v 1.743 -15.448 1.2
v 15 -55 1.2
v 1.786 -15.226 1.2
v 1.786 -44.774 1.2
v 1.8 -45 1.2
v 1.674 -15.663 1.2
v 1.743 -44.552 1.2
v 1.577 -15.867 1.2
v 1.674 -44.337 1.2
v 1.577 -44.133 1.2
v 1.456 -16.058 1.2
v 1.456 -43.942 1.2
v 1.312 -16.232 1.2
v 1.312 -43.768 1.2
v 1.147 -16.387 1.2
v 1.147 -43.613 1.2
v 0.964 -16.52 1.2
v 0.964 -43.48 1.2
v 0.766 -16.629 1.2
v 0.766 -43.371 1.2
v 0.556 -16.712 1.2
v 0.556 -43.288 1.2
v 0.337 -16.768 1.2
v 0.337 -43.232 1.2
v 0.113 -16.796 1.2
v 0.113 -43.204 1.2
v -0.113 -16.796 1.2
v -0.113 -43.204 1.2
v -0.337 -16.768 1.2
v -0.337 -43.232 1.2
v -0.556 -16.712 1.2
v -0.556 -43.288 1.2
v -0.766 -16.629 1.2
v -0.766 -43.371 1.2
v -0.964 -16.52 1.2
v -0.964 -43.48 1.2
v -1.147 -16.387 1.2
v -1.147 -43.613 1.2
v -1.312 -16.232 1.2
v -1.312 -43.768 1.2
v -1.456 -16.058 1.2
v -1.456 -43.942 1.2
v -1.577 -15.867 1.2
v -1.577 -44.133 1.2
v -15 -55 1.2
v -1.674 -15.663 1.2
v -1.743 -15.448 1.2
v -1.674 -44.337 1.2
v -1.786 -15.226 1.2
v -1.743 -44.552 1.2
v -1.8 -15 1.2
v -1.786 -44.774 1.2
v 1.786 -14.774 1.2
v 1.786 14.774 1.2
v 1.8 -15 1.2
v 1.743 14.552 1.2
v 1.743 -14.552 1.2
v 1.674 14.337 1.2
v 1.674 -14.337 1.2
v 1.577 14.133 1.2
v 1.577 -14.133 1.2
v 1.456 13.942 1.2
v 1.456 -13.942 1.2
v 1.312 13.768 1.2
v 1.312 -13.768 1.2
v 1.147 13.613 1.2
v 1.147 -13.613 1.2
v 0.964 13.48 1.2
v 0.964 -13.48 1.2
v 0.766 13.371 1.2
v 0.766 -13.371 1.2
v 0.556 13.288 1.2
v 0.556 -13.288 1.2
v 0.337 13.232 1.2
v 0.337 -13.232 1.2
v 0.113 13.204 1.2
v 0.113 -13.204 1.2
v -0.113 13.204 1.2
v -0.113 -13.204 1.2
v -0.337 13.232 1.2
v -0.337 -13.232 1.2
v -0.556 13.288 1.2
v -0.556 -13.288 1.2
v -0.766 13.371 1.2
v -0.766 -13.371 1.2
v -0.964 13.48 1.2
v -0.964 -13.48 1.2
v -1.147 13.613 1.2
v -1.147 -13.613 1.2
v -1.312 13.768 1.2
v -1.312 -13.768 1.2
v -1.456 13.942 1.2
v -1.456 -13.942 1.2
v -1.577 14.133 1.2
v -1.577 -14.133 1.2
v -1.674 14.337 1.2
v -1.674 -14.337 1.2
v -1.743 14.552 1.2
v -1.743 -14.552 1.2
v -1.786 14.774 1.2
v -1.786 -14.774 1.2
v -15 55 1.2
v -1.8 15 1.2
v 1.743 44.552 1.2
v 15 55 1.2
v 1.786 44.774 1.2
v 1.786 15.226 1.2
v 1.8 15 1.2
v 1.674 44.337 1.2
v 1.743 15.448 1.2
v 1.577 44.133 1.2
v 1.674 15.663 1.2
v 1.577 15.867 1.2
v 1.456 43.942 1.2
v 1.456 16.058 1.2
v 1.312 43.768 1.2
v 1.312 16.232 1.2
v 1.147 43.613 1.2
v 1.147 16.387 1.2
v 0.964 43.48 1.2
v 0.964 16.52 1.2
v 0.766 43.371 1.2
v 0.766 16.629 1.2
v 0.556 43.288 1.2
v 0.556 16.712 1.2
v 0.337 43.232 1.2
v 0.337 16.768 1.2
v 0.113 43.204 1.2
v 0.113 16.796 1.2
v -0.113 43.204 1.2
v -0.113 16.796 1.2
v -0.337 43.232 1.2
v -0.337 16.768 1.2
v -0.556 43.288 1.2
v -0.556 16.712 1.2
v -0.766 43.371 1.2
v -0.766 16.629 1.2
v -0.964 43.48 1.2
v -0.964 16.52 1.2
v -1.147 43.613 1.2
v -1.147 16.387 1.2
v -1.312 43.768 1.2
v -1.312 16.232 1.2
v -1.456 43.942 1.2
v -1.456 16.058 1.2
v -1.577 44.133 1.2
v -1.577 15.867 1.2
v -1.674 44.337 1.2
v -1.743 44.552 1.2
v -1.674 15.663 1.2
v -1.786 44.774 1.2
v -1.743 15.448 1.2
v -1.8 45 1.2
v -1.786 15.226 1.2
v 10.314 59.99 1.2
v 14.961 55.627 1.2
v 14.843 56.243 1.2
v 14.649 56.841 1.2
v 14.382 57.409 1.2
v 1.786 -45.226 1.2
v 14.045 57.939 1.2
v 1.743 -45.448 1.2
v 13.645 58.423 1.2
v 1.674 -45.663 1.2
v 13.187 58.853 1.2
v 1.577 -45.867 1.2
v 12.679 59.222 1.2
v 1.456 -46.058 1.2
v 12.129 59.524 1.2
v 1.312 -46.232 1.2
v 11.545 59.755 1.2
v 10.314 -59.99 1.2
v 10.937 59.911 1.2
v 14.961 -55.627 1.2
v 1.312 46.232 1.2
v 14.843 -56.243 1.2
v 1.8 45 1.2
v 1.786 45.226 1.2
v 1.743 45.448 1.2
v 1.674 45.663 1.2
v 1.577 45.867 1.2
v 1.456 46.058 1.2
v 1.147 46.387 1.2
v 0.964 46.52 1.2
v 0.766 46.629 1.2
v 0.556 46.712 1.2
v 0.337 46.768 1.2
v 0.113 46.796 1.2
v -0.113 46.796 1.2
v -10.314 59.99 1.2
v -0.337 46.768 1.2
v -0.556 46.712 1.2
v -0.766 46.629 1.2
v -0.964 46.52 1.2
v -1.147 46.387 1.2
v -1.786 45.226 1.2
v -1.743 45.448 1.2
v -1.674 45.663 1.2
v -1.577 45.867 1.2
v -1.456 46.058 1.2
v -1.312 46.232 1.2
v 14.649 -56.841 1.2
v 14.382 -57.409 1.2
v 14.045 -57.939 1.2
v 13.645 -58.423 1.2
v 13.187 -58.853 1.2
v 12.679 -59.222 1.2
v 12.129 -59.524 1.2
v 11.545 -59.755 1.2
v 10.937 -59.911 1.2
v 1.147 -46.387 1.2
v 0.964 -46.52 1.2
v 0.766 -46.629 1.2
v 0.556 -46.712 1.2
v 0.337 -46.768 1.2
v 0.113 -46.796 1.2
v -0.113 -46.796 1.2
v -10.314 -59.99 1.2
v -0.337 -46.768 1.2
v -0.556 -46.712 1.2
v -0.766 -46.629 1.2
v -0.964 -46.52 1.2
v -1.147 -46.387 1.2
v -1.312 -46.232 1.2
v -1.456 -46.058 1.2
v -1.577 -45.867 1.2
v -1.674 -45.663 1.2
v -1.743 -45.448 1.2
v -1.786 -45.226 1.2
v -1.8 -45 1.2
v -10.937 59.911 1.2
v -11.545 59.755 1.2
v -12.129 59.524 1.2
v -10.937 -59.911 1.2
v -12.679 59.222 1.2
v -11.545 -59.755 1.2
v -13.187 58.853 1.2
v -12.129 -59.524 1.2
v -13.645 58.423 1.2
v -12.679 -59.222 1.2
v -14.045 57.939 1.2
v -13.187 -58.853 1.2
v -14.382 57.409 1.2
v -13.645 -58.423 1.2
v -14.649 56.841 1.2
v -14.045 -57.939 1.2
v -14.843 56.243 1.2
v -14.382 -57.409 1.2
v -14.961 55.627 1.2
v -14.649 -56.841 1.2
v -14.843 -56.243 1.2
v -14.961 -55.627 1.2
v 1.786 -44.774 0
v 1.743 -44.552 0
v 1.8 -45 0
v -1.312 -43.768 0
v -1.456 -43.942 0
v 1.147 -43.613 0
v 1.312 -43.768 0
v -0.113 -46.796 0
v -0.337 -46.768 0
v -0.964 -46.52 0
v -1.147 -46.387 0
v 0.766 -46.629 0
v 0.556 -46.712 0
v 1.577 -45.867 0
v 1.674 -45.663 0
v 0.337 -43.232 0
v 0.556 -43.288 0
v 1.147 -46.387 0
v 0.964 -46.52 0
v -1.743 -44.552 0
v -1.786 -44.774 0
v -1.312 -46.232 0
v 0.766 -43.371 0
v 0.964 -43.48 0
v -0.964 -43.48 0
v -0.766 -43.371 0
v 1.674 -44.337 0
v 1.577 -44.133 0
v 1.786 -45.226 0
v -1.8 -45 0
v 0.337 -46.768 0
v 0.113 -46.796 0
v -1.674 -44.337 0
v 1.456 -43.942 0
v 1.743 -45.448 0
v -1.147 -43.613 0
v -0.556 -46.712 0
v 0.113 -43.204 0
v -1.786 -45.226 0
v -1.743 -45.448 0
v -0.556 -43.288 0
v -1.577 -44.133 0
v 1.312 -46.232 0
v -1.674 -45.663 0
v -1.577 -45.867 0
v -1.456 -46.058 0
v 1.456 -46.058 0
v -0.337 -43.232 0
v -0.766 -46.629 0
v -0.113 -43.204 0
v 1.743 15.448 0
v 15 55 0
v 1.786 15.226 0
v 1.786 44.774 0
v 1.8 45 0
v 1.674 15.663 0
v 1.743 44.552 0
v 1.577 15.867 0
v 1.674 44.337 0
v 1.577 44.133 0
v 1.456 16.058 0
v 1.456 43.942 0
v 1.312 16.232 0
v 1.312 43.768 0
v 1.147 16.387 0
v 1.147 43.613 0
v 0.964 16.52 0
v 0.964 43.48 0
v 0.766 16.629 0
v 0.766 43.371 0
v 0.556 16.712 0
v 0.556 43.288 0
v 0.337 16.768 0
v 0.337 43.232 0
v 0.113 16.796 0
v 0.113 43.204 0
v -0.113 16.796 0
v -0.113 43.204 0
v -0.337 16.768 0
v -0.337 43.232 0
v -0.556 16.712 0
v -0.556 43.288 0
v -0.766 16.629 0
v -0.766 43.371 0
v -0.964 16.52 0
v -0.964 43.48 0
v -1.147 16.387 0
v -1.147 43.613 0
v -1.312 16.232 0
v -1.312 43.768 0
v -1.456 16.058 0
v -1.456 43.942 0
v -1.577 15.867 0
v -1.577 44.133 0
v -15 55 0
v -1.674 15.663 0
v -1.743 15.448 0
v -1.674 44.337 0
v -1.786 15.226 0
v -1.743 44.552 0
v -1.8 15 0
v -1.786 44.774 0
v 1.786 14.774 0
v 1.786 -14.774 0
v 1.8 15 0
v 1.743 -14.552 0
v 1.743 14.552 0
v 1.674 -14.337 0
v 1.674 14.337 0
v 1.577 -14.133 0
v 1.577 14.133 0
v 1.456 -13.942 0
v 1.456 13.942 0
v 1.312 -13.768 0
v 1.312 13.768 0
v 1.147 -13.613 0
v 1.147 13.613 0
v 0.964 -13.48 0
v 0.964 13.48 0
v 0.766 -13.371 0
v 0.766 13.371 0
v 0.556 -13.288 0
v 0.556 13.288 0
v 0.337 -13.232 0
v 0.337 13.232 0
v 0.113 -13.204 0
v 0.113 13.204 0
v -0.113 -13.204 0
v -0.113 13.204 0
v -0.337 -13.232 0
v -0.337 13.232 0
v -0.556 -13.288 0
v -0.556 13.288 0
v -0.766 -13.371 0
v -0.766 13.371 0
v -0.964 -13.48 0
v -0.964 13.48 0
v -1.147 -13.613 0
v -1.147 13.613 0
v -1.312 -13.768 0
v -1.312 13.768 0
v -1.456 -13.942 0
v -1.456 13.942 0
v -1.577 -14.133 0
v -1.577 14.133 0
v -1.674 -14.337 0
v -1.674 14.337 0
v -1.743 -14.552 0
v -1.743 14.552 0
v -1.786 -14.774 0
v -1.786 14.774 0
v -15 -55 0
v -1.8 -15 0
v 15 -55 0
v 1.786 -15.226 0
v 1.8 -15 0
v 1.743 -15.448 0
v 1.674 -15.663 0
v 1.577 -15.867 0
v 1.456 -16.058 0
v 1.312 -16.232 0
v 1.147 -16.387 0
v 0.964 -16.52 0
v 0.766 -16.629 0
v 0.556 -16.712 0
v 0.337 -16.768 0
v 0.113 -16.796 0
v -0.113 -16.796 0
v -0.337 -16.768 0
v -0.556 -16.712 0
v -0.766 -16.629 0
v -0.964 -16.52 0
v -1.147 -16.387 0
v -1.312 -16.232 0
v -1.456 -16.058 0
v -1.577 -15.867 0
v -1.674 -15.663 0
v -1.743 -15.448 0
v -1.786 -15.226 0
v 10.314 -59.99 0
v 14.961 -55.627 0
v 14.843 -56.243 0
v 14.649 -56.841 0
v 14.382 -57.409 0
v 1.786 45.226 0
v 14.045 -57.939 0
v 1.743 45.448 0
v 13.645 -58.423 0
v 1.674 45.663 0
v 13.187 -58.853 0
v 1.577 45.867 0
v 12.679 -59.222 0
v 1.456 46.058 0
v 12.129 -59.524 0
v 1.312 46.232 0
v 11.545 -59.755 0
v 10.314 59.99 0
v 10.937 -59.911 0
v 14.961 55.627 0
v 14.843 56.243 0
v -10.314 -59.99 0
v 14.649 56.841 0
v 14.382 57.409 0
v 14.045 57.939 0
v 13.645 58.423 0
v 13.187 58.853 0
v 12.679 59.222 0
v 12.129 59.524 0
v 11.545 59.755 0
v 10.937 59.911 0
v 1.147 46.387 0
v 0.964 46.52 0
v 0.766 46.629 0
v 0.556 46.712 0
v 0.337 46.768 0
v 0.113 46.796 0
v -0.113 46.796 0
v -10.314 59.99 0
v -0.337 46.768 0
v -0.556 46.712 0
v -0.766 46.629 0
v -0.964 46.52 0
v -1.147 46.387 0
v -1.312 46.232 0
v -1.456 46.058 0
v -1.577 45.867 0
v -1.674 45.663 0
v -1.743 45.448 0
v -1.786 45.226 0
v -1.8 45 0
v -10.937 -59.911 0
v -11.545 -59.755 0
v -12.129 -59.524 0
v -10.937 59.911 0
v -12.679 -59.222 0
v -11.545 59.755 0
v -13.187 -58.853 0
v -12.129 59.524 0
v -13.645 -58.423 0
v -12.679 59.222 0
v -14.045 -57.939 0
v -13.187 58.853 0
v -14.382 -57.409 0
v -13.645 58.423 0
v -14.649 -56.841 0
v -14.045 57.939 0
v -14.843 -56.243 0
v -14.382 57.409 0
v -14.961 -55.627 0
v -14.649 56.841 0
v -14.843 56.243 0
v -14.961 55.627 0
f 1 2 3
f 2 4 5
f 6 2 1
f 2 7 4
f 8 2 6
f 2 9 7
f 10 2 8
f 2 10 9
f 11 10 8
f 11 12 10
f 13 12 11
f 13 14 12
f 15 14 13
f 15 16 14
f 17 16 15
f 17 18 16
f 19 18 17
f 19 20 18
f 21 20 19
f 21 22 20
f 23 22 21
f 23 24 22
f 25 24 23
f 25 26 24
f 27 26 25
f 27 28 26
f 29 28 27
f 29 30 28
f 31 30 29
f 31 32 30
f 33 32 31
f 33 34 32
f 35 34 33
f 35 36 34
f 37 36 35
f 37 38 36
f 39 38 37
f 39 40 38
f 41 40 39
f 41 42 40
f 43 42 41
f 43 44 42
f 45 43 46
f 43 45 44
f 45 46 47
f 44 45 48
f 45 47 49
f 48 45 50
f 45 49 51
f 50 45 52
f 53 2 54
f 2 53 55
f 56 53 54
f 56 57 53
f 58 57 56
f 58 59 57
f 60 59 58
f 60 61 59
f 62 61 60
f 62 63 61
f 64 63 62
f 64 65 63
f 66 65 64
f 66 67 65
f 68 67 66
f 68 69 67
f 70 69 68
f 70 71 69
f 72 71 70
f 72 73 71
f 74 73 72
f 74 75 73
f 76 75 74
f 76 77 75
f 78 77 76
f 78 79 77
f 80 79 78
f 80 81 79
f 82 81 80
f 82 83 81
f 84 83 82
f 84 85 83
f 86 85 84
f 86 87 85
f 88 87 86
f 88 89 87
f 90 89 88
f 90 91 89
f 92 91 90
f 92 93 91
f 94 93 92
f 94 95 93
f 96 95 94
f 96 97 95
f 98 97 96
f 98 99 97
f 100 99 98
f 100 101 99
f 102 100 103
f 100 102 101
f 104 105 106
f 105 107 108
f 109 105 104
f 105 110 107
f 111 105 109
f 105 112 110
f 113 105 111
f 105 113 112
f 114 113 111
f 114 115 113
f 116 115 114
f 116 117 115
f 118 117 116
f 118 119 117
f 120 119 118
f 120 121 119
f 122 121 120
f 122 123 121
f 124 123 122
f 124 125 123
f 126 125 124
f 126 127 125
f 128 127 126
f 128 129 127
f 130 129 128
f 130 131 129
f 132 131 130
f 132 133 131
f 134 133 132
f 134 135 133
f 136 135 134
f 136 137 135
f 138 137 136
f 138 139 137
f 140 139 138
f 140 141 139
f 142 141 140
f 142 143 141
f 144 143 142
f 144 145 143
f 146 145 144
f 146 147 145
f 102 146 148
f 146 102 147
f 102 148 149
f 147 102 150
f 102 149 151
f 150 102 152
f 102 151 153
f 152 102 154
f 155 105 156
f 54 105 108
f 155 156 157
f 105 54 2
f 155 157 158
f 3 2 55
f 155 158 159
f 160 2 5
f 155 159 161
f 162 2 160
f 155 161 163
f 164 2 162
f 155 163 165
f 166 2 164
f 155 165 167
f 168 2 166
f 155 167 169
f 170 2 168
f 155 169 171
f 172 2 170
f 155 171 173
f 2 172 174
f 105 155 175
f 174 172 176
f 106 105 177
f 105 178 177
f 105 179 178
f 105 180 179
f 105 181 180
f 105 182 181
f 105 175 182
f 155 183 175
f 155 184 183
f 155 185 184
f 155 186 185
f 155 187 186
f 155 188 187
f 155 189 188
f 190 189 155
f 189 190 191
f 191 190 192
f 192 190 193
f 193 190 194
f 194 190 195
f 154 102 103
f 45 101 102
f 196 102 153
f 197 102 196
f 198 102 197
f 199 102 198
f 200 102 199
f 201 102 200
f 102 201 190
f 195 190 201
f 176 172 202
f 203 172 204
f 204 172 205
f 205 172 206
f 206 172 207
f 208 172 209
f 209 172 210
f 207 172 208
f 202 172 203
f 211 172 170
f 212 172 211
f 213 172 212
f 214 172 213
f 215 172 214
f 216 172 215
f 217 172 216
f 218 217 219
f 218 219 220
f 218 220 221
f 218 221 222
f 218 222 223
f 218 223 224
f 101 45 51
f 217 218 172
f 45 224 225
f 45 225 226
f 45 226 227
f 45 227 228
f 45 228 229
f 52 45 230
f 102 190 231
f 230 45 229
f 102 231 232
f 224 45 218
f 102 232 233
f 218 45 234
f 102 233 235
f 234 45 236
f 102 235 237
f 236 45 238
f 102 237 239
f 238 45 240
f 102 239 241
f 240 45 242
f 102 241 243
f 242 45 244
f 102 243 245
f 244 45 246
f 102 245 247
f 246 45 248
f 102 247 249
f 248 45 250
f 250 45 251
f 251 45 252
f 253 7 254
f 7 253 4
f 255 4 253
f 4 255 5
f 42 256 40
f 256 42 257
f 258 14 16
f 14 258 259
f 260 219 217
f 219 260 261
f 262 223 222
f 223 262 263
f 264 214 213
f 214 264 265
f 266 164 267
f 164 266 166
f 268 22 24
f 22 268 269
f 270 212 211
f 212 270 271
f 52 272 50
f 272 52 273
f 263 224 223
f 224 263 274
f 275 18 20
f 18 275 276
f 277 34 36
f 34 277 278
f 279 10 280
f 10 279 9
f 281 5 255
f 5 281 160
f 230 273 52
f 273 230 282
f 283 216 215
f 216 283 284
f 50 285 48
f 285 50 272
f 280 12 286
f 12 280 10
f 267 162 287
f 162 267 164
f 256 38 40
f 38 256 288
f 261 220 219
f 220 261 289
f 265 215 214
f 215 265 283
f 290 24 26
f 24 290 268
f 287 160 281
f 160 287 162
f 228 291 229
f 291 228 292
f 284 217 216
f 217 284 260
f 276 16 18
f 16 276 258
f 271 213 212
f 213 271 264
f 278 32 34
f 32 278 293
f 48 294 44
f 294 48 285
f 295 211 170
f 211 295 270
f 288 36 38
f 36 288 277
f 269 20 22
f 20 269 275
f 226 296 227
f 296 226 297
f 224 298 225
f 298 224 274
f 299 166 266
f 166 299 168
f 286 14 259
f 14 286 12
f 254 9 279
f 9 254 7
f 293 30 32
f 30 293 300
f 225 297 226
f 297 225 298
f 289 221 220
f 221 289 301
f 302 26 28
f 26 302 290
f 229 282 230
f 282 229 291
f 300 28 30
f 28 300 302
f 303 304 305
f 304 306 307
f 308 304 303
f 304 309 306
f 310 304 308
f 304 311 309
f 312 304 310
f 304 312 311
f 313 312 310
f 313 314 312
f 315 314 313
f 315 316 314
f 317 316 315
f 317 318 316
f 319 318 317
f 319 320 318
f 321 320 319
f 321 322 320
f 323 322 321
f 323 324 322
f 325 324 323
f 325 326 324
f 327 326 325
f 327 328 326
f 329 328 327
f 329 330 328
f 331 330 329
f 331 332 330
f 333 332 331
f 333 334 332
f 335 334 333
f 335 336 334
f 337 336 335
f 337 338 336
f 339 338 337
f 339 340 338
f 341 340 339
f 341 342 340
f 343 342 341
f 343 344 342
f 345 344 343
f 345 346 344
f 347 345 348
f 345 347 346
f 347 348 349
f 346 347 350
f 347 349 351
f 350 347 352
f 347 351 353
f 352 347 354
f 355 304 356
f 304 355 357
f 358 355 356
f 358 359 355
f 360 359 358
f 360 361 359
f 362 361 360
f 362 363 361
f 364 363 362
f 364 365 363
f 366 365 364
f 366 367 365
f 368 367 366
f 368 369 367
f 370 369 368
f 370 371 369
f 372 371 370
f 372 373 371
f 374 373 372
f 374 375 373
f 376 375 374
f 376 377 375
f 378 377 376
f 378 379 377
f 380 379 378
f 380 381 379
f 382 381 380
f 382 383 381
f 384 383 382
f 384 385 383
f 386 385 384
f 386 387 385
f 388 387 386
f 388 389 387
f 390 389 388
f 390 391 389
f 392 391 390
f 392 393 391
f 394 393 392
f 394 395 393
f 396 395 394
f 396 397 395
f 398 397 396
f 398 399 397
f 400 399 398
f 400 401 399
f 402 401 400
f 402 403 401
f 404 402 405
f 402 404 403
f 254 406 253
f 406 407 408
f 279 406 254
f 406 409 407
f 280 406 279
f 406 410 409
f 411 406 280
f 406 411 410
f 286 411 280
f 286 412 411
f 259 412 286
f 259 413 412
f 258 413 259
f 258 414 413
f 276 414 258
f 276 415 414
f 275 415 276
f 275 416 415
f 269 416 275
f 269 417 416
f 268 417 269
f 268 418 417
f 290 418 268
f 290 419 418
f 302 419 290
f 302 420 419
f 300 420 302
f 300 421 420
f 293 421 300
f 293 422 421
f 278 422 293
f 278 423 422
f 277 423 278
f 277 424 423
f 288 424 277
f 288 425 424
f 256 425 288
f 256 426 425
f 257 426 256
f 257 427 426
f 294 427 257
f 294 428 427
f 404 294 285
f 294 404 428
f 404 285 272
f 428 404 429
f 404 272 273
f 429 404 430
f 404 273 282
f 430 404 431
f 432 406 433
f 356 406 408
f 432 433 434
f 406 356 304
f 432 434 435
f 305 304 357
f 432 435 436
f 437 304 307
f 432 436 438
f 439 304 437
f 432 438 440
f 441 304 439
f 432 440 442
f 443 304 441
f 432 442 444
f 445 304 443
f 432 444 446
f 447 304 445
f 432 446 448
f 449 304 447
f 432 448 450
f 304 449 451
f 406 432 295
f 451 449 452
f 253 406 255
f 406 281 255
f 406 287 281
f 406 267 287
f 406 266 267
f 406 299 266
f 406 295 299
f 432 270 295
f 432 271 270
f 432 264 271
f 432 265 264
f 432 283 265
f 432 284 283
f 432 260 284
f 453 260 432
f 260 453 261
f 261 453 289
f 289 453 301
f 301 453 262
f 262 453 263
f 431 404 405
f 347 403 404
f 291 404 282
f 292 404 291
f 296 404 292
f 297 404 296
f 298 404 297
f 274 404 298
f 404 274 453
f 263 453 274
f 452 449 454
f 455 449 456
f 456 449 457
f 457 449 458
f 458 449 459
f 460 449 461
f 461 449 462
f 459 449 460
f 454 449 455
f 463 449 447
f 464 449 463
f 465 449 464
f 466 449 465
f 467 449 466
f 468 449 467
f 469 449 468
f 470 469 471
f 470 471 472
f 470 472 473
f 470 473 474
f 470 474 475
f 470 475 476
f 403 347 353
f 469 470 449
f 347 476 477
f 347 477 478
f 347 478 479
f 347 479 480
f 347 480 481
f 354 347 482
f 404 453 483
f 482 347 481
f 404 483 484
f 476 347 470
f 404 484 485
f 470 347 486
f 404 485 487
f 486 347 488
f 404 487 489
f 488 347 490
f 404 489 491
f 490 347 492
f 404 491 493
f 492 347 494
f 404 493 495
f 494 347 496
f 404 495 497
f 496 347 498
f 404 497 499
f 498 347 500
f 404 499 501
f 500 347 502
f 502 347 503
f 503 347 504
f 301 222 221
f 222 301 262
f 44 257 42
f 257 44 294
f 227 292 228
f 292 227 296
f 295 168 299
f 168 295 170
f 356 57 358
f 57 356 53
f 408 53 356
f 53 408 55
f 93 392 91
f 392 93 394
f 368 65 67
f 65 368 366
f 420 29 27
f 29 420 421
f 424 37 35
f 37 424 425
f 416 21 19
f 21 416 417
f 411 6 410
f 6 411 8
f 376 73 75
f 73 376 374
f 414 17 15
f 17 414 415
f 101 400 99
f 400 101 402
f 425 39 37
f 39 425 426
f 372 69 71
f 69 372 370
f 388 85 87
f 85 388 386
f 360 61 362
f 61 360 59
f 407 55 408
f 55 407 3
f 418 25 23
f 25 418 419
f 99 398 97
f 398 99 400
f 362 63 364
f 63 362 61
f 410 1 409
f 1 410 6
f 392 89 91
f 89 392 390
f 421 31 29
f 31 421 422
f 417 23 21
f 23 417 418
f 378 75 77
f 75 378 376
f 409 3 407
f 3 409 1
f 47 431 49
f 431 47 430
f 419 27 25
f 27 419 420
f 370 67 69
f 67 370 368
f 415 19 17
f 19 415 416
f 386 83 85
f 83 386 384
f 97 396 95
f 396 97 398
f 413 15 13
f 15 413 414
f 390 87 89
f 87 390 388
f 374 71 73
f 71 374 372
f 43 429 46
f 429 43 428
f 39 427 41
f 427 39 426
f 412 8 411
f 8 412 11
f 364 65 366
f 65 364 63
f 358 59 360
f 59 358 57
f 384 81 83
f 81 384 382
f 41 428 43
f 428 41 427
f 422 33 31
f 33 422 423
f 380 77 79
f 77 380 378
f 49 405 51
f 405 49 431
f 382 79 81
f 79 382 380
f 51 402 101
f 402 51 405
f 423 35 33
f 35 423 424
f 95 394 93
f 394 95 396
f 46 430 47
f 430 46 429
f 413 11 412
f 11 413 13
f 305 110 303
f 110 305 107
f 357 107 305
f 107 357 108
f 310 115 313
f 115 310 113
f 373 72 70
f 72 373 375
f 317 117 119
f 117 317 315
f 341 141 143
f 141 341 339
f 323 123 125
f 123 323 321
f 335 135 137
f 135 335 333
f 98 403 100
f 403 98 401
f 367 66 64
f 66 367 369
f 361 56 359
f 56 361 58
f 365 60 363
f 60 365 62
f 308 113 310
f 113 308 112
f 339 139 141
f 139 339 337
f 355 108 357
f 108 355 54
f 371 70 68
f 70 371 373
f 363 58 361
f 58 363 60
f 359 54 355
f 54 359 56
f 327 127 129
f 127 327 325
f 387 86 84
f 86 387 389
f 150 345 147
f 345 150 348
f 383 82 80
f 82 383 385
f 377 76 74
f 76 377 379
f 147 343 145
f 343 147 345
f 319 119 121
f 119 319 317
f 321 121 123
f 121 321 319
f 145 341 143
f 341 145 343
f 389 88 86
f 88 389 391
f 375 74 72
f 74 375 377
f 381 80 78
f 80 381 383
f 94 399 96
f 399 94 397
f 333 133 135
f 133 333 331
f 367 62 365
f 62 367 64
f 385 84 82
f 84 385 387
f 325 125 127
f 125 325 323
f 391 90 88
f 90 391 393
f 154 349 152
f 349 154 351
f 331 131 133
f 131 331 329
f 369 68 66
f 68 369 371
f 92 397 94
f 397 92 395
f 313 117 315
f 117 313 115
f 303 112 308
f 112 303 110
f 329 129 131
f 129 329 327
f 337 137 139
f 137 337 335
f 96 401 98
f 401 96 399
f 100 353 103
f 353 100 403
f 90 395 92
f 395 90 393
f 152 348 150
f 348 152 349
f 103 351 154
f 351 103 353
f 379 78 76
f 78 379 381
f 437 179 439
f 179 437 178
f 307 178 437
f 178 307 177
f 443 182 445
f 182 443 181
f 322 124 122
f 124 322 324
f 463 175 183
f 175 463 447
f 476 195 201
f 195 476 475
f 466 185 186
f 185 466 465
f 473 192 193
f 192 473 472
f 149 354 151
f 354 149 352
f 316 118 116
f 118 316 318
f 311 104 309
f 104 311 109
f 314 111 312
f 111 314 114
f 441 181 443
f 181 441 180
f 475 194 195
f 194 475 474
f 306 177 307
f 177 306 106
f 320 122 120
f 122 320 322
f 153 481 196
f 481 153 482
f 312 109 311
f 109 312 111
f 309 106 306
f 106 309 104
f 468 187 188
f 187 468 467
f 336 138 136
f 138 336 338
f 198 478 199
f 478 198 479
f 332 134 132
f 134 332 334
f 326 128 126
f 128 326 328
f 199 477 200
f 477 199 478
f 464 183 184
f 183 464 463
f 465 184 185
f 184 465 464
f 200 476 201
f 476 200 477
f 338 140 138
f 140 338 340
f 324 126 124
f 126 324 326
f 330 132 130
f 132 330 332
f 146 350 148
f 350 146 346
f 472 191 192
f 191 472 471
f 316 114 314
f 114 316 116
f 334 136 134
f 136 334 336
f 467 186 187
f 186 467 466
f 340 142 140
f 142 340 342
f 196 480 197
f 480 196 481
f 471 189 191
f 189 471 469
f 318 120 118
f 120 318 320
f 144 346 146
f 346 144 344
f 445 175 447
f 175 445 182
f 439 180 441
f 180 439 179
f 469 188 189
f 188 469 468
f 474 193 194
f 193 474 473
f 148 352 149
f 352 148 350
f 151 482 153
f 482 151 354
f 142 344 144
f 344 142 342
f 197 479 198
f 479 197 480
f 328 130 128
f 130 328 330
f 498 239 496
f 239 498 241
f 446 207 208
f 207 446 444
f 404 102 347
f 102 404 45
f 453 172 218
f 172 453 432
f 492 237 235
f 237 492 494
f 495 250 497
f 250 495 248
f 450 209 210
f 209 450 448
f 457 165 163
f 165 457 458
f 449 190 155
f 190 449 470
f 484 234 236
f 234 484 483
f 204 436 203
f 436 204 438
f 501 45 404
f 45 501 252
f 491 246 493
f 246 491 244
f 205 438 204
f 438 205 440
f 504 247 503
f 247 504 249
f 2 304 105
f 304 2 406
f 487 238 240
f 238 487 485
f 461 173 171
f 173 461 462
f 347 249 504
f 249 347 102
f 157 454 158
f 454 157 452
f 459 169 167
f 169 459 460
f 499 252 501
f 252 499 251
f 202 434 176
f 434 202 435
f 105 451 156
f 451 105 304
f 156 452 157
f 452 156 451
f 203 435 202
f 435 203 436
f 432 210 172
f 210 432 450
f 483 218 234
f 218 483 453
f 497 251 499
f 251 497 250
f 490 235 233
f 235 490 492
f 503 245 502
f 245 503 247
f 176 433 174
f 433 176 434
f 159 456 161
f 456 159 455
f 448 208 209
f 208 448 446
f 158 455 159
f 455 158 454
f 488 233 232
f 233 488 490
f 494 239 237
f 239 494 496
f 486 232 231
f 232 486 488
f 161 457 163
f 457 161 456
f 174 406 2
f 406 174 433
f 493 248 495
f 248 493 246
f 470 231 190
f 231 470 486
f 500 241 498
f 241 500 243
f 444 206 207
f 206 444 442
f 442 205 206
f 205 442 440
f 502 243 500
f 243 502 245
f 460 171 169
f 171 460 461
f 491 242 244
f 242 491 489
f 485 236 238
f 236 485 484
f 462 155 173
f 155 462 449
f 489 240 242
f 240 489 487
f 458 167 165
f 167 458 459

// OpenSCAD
$fn = 50;


difference() {
	union() {
		hull() {
			translate(v = [-10.0000000000, 55.0000000000, 0]) {
				cylinder(h = 99, r = 5);
			}
			translate(v = [10.0000000000, 55.0000000000, 0]) {
				cylinder(h = 99, r = 5);
			}
			translate(v = [-10.0000000000, -55.0000000000, 0]) {
				cylinder(h = 99, r = 5);
			}
			translate(v = [10.0000000000, -55.0000000000, 0]) {
				cylinder(h = 99, r = 5);
			}
		}
	}
	union() {
		translate(v = [0, 0, 1.2000000000]) {
			hull() {
				translate(v = [-10.0000000000, 55.0000000000, 0]) {
					cylinder(h = 97.8000000000, r = 3.8000000000);
				}
				translate(v = [10.0000000000, 55.0000000000, 0]) {
					cylinder(h = 97.8000000000, r = 3.8000000000);
				}
				translate(v = [-10.0000000000, -55.0000000000, 0]) {
					cylinder(h = 97.8000000000, r = 3.8000000000);
				}
				translate(v = [10.0000000000, -55.0000000000, 0]) {
					cylinder(h = 97.8000000000, r = 3.8000000000);
				}
			}
		}
		#translate(v = [0.0000000000, -45.0000000000, 0]) {
			cylinder(h = 1.2000000000, r = 1.8000000000);
		}
		#translate(v = [0.0000000000, -15.0000000000, 0]) {
			cylinder(h = 1.2000000000, r = 1.8000000000);
		}
		#translate(v = [0.0000000000, 15.0000000000, 0]) {
			cylinder(h = 1.2000000000, r = 1.8000000000);
		}
		#translate(v = [0.0000000000, 45.0000000000, 0]) {
			cylinder(h = 1.2000000000, r = 1.8000000000);
		}
		translate(v = [-250.0000000000, -250.0000000000, 1.2000000000]) {
			cube(size = [500, 500, 500]);
		}
		translate(v = [-250.0000000000, -250.0000000000, 1.2000000000]) {
			cube(size = [500, 500, 500]);
		}
		translate(v = [-250.0000000000, -250.0000000000, 1.2000000000]) {
			cube(size = [500, 500, 500]);
		}
	}
}
